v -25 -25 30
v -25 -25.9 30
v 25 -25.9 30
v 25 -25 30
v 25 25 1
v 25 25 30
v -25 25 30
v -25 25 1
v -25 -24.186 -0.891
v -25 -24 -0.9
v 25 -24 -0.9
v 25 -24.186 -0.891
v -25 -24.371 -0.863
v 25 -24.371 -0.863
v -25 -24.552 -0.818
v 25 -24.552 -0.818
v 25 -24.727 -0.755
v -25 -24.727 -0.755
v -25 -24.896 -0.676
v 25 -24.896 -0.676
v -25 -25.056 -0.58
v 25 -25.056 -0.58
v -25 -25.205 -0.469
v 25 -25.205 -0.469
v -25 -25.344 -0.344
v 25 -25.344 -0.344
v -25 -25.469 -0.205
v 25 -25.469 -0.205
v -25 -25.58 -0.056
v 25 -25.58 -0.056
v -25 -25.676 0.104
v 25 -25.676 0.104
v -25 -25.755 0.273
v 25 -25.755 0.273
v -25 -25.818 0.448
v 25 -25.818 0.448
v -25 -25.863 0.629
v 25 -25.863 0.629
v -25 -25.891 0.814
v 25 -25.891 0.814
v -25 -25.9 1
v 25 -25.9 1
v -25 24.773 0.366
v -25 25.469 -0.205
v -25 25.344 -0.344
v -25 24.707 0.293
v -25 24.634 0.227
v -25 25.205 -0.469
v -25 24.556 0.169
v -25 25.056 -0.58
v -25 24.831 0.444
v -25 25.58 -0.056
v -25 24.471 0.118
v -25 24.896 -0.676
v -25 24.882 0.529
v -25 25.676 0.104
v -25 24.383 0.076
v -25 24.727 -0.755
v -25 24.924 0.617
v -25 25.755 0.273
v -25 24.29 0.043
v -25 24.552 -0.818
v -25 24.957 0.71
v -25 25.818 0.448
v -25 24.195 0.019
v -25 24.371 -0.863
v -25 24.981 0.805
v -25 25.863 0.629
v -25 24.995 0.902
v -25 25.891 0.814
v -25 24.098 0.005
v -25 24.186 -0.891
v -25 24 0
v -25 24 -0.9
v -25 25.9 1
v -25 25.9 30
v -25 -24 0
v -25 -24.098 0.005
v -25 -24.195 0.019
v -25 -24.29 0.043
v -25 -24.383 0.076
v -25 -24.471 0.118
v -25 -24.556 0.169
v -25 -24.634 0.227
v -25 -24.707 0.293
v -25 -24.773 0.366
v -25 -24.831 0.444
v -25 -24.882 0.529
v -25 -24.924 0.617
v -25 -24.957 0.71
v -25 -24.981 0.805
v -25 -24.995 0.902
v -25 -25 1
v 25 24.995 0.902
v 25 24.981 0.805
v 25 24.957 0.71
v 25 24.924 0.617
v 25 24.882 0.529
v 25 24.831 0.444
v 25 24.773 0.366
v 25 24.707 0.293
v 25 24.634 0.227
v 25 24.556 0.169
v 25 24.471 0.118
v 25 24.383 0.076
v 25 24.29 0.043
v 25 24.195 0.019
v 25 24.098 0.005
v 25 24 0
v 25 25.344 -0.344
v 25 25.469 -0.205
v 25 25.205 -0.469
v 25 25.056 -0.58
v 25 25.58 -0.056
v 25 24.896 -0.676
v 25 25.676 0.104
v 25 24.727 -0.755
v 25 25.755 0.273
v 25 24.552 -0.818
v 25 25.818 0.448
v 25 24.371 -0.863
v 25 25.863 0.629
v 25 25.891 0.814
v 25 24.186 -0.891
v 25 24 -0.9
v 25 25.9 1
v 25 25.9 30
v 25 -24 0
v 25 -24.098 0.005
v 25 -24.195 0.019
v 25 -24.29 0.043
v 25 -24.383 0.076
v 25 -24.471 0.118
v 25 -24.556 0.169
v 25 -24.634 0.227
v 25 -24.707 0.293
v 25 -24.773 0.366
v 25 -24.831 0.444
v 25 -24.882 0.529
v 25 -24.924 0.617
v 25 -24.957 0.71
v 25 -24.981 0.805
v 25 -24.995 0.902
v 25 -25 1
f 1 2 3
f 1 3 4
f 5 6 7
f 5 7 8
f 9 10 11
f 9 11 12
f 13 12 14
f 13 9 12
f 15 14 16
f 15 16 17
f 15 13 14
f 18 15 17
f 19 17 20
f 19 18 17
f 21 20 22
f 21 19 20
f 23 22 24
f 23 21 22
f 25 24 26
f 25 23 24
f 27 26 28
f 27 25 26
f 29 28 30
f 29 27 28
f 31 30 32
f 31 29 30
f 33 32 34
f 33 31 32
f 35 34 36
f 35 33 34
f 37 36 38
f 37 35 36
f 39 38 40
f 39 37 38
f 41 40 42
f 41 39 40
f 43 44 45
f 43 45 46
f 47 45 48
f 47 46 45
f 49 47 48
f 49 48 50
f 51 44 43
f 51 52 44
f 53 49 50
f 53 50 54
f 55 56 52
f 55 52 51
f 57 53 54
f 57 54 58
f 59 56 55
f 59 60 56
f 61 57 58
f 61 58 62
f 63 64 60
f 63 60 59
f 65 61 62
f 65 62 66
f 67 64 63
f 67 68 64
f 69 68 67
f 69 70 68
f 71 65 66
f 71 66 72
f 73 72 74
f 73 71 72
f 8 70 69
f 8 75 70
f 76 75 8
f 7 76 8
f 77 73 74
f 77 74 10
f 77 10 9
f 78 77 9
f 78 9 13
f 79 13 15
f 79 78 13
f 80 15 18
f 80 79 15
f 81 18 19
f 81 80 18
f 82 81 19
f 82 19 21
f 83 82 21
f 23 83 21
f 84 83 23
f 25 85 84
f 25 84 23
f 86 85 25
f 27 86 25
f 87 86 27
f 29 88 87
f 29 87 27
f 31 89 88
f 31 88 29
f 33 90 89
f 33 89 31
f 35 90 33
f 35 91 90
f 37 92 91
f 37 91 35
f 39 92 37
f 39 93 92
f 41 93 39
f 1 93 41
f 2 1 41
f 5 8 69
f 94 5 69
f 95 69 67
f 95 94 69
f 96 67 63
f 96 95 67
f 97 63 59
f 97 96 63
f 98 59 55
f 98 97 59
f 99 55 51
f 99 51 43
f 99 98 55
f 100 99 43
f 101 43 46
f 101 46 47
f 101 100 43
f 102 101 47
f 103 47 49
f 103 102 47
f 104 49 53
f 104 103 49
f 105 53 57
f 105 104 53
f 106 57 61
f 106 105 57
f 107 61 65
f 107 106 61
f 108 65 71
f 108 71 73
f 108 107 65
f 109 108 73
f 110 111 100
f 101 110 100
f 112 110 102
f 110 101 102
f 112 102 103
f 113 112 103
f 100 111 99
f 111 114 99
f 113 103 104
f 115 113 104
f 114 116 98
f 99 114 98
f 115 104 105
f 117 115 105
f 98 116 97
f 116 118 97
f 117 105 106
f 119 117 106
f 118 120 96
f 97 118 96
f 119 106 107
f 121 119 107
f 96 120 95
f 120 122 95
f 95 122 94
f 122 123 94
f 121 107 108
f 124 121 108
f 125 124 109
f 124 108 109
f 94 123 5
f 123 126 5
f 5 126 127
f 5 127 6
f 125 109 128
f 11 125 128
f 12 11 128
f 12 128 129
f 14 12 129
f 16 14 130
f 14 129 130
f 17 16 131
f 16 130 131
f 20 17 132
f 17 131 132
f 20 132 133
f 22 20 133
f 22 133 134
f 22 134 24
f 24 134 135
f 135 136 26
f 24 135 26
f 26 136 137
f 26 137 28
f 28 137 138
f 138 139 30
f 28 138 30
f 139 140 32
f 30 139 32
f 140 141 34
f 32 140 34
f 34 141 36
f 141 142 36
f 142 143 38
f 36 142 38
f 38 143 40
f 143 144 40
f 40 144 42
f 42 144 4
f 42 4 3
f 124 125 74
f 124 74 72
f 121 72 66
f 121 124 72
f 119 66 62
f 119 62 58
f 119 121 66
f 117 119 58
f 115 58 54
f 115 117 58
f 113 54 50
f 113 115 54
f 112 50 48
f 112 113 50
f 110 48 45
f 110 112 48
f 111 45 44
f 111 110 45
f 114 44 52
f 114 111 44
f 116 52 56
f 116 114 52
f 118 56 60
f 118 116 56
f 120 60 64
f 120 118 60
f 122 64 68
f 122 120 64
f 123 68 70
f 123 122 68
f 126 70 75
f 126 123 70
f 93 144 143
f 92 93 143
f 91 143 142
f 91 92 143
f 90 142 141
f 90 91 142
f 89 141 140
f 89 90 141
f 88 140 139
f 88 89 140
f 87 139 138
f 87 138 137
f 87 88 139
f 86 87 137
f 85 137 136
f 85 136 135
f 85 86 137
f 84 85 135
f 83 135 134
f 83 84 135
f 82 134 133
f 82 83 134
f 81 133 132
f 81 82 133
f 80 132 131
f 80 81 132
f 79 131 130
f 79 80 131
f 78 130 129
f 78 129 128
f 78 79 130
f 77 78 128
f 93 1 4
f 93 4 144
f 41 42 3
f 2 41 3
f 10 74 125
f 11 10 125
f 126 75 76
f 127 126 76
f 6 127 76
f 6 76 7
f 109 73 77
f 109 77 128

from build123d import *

# Parameters (mm, degrees)
SKETCH1_W                    = 50
SKETCH1_H                    = 50
BASE_FLANGE1_DEPTH           = 0.9
EDGE_FLANGE1_STRIP_W         = 5.6
EDGE_FLANGE1_STRIP_H         = 0.9
EDGE_FLANGE1_STRIP_CUT_DEPTH = 50
EDGE_FLANGE1_DEPTH           = 50
EDGE_FLANGE2_STRIP_W         = 5.6
EDGE_FLANGE2_STRIP_H         = 0.9
EDGE_FLANGE2_STRIP_CUT_DEPTH = 50
EDGE_FLANGE2_DEPTH           = 50


# Sheet-metal steps are written as plain solids
with BuildPart() as part:
    # Sketch1 → Base-Flange1 (new body)
    with BuildSketch(Plane.XY):
        Rectangle(SKETCH1_W, SKETCH1_H)
    extrude(amount=-BASE_FLANGE1_DEPTH)

    # Edge-Flange1 strip (across the edge) → Edge-Flange1 strip cut (cut)
    with BuildSketch(Plane(origin=(25, 25, 0), x_dir=(0, -1, 0), z_dir=(-1, 0, 0))):
        with Locations((-1.8, -0.45)):
            Rectangle(EDGE_FLANGE1_STRIP_W, EDGE_FLANGE1_STRIP_H)
    extrude(amount=EDGE_FLANGE1_STRIP_CUT_DEPTH, mode=Mode.SUBTRACT)

    # Edge-Flange1 section (across the edge) → Edge-Flange1 (add)
    with BuildSketch(Plane(origin=(25, 25, 0), x_dir=(0, -1, 0), z_dir=(-1, 0, 0))):
        with BuildLine():
            Line((-0.9, 1), (-0.9, 30))
            Line((-0.9, 30), (0, 30))
            Line((0, 30), (0, 1))
            ThreePointArc((0, 1), (0.292893219, 0.292893219), (1, 0))
            Line((1, 0), (1, -0.9))
            ThreePointArc((1, -0.9), (-0.343502884, -0.343502884), (-0.9, 1))
        make_face()
    extrude(amount=EDGE_FLANGE1_DEPTH)

    # Edge-Flange2 strip (across the edge) → Edge-Flange2 strip cut (cut)
    with BuildSketch(Plane(origin=(-25, -25, 0), x_dir=(0, 1, 0), z_dir=(1, 0, 0))):
        with Locations((-1.8, -0.45)):
            Rectangle(EDGE_FLANGE2_STRIP_W, EDGE_FLANGE2_STRIP_H)
    extrude(amount=EDGE_FLANGE2_STRIP_CUT_DEPTH, mode=Mode.SUBTRACT)

    # Edge-Flange2 section (across the edge) → Edge-Flange2 (add)
    with BuildSketch(Plane(origin=(-25, -25, 0), x_dir=(0, 1, 0), z_dir=(1, 0, 0))):
        with BuildLine():
            Line((-0.9, 1), (-0.9, 30))
            Line((-0.9, 30), (0, 30))
            Line((0, 30), (0, 1))
            ThreePointArc((0, 1), (0.292893219, 0.292893219), (1, 0))
            Line((1, 0), (1, -0.9))
            ThreePointArc((1, -0.9), (-0.343502884, -0.343502884), (-0.9, 1))
        make_face()
    extrude(amount=EDGE_FLANGE2_DEPTH)


solid = part.part
